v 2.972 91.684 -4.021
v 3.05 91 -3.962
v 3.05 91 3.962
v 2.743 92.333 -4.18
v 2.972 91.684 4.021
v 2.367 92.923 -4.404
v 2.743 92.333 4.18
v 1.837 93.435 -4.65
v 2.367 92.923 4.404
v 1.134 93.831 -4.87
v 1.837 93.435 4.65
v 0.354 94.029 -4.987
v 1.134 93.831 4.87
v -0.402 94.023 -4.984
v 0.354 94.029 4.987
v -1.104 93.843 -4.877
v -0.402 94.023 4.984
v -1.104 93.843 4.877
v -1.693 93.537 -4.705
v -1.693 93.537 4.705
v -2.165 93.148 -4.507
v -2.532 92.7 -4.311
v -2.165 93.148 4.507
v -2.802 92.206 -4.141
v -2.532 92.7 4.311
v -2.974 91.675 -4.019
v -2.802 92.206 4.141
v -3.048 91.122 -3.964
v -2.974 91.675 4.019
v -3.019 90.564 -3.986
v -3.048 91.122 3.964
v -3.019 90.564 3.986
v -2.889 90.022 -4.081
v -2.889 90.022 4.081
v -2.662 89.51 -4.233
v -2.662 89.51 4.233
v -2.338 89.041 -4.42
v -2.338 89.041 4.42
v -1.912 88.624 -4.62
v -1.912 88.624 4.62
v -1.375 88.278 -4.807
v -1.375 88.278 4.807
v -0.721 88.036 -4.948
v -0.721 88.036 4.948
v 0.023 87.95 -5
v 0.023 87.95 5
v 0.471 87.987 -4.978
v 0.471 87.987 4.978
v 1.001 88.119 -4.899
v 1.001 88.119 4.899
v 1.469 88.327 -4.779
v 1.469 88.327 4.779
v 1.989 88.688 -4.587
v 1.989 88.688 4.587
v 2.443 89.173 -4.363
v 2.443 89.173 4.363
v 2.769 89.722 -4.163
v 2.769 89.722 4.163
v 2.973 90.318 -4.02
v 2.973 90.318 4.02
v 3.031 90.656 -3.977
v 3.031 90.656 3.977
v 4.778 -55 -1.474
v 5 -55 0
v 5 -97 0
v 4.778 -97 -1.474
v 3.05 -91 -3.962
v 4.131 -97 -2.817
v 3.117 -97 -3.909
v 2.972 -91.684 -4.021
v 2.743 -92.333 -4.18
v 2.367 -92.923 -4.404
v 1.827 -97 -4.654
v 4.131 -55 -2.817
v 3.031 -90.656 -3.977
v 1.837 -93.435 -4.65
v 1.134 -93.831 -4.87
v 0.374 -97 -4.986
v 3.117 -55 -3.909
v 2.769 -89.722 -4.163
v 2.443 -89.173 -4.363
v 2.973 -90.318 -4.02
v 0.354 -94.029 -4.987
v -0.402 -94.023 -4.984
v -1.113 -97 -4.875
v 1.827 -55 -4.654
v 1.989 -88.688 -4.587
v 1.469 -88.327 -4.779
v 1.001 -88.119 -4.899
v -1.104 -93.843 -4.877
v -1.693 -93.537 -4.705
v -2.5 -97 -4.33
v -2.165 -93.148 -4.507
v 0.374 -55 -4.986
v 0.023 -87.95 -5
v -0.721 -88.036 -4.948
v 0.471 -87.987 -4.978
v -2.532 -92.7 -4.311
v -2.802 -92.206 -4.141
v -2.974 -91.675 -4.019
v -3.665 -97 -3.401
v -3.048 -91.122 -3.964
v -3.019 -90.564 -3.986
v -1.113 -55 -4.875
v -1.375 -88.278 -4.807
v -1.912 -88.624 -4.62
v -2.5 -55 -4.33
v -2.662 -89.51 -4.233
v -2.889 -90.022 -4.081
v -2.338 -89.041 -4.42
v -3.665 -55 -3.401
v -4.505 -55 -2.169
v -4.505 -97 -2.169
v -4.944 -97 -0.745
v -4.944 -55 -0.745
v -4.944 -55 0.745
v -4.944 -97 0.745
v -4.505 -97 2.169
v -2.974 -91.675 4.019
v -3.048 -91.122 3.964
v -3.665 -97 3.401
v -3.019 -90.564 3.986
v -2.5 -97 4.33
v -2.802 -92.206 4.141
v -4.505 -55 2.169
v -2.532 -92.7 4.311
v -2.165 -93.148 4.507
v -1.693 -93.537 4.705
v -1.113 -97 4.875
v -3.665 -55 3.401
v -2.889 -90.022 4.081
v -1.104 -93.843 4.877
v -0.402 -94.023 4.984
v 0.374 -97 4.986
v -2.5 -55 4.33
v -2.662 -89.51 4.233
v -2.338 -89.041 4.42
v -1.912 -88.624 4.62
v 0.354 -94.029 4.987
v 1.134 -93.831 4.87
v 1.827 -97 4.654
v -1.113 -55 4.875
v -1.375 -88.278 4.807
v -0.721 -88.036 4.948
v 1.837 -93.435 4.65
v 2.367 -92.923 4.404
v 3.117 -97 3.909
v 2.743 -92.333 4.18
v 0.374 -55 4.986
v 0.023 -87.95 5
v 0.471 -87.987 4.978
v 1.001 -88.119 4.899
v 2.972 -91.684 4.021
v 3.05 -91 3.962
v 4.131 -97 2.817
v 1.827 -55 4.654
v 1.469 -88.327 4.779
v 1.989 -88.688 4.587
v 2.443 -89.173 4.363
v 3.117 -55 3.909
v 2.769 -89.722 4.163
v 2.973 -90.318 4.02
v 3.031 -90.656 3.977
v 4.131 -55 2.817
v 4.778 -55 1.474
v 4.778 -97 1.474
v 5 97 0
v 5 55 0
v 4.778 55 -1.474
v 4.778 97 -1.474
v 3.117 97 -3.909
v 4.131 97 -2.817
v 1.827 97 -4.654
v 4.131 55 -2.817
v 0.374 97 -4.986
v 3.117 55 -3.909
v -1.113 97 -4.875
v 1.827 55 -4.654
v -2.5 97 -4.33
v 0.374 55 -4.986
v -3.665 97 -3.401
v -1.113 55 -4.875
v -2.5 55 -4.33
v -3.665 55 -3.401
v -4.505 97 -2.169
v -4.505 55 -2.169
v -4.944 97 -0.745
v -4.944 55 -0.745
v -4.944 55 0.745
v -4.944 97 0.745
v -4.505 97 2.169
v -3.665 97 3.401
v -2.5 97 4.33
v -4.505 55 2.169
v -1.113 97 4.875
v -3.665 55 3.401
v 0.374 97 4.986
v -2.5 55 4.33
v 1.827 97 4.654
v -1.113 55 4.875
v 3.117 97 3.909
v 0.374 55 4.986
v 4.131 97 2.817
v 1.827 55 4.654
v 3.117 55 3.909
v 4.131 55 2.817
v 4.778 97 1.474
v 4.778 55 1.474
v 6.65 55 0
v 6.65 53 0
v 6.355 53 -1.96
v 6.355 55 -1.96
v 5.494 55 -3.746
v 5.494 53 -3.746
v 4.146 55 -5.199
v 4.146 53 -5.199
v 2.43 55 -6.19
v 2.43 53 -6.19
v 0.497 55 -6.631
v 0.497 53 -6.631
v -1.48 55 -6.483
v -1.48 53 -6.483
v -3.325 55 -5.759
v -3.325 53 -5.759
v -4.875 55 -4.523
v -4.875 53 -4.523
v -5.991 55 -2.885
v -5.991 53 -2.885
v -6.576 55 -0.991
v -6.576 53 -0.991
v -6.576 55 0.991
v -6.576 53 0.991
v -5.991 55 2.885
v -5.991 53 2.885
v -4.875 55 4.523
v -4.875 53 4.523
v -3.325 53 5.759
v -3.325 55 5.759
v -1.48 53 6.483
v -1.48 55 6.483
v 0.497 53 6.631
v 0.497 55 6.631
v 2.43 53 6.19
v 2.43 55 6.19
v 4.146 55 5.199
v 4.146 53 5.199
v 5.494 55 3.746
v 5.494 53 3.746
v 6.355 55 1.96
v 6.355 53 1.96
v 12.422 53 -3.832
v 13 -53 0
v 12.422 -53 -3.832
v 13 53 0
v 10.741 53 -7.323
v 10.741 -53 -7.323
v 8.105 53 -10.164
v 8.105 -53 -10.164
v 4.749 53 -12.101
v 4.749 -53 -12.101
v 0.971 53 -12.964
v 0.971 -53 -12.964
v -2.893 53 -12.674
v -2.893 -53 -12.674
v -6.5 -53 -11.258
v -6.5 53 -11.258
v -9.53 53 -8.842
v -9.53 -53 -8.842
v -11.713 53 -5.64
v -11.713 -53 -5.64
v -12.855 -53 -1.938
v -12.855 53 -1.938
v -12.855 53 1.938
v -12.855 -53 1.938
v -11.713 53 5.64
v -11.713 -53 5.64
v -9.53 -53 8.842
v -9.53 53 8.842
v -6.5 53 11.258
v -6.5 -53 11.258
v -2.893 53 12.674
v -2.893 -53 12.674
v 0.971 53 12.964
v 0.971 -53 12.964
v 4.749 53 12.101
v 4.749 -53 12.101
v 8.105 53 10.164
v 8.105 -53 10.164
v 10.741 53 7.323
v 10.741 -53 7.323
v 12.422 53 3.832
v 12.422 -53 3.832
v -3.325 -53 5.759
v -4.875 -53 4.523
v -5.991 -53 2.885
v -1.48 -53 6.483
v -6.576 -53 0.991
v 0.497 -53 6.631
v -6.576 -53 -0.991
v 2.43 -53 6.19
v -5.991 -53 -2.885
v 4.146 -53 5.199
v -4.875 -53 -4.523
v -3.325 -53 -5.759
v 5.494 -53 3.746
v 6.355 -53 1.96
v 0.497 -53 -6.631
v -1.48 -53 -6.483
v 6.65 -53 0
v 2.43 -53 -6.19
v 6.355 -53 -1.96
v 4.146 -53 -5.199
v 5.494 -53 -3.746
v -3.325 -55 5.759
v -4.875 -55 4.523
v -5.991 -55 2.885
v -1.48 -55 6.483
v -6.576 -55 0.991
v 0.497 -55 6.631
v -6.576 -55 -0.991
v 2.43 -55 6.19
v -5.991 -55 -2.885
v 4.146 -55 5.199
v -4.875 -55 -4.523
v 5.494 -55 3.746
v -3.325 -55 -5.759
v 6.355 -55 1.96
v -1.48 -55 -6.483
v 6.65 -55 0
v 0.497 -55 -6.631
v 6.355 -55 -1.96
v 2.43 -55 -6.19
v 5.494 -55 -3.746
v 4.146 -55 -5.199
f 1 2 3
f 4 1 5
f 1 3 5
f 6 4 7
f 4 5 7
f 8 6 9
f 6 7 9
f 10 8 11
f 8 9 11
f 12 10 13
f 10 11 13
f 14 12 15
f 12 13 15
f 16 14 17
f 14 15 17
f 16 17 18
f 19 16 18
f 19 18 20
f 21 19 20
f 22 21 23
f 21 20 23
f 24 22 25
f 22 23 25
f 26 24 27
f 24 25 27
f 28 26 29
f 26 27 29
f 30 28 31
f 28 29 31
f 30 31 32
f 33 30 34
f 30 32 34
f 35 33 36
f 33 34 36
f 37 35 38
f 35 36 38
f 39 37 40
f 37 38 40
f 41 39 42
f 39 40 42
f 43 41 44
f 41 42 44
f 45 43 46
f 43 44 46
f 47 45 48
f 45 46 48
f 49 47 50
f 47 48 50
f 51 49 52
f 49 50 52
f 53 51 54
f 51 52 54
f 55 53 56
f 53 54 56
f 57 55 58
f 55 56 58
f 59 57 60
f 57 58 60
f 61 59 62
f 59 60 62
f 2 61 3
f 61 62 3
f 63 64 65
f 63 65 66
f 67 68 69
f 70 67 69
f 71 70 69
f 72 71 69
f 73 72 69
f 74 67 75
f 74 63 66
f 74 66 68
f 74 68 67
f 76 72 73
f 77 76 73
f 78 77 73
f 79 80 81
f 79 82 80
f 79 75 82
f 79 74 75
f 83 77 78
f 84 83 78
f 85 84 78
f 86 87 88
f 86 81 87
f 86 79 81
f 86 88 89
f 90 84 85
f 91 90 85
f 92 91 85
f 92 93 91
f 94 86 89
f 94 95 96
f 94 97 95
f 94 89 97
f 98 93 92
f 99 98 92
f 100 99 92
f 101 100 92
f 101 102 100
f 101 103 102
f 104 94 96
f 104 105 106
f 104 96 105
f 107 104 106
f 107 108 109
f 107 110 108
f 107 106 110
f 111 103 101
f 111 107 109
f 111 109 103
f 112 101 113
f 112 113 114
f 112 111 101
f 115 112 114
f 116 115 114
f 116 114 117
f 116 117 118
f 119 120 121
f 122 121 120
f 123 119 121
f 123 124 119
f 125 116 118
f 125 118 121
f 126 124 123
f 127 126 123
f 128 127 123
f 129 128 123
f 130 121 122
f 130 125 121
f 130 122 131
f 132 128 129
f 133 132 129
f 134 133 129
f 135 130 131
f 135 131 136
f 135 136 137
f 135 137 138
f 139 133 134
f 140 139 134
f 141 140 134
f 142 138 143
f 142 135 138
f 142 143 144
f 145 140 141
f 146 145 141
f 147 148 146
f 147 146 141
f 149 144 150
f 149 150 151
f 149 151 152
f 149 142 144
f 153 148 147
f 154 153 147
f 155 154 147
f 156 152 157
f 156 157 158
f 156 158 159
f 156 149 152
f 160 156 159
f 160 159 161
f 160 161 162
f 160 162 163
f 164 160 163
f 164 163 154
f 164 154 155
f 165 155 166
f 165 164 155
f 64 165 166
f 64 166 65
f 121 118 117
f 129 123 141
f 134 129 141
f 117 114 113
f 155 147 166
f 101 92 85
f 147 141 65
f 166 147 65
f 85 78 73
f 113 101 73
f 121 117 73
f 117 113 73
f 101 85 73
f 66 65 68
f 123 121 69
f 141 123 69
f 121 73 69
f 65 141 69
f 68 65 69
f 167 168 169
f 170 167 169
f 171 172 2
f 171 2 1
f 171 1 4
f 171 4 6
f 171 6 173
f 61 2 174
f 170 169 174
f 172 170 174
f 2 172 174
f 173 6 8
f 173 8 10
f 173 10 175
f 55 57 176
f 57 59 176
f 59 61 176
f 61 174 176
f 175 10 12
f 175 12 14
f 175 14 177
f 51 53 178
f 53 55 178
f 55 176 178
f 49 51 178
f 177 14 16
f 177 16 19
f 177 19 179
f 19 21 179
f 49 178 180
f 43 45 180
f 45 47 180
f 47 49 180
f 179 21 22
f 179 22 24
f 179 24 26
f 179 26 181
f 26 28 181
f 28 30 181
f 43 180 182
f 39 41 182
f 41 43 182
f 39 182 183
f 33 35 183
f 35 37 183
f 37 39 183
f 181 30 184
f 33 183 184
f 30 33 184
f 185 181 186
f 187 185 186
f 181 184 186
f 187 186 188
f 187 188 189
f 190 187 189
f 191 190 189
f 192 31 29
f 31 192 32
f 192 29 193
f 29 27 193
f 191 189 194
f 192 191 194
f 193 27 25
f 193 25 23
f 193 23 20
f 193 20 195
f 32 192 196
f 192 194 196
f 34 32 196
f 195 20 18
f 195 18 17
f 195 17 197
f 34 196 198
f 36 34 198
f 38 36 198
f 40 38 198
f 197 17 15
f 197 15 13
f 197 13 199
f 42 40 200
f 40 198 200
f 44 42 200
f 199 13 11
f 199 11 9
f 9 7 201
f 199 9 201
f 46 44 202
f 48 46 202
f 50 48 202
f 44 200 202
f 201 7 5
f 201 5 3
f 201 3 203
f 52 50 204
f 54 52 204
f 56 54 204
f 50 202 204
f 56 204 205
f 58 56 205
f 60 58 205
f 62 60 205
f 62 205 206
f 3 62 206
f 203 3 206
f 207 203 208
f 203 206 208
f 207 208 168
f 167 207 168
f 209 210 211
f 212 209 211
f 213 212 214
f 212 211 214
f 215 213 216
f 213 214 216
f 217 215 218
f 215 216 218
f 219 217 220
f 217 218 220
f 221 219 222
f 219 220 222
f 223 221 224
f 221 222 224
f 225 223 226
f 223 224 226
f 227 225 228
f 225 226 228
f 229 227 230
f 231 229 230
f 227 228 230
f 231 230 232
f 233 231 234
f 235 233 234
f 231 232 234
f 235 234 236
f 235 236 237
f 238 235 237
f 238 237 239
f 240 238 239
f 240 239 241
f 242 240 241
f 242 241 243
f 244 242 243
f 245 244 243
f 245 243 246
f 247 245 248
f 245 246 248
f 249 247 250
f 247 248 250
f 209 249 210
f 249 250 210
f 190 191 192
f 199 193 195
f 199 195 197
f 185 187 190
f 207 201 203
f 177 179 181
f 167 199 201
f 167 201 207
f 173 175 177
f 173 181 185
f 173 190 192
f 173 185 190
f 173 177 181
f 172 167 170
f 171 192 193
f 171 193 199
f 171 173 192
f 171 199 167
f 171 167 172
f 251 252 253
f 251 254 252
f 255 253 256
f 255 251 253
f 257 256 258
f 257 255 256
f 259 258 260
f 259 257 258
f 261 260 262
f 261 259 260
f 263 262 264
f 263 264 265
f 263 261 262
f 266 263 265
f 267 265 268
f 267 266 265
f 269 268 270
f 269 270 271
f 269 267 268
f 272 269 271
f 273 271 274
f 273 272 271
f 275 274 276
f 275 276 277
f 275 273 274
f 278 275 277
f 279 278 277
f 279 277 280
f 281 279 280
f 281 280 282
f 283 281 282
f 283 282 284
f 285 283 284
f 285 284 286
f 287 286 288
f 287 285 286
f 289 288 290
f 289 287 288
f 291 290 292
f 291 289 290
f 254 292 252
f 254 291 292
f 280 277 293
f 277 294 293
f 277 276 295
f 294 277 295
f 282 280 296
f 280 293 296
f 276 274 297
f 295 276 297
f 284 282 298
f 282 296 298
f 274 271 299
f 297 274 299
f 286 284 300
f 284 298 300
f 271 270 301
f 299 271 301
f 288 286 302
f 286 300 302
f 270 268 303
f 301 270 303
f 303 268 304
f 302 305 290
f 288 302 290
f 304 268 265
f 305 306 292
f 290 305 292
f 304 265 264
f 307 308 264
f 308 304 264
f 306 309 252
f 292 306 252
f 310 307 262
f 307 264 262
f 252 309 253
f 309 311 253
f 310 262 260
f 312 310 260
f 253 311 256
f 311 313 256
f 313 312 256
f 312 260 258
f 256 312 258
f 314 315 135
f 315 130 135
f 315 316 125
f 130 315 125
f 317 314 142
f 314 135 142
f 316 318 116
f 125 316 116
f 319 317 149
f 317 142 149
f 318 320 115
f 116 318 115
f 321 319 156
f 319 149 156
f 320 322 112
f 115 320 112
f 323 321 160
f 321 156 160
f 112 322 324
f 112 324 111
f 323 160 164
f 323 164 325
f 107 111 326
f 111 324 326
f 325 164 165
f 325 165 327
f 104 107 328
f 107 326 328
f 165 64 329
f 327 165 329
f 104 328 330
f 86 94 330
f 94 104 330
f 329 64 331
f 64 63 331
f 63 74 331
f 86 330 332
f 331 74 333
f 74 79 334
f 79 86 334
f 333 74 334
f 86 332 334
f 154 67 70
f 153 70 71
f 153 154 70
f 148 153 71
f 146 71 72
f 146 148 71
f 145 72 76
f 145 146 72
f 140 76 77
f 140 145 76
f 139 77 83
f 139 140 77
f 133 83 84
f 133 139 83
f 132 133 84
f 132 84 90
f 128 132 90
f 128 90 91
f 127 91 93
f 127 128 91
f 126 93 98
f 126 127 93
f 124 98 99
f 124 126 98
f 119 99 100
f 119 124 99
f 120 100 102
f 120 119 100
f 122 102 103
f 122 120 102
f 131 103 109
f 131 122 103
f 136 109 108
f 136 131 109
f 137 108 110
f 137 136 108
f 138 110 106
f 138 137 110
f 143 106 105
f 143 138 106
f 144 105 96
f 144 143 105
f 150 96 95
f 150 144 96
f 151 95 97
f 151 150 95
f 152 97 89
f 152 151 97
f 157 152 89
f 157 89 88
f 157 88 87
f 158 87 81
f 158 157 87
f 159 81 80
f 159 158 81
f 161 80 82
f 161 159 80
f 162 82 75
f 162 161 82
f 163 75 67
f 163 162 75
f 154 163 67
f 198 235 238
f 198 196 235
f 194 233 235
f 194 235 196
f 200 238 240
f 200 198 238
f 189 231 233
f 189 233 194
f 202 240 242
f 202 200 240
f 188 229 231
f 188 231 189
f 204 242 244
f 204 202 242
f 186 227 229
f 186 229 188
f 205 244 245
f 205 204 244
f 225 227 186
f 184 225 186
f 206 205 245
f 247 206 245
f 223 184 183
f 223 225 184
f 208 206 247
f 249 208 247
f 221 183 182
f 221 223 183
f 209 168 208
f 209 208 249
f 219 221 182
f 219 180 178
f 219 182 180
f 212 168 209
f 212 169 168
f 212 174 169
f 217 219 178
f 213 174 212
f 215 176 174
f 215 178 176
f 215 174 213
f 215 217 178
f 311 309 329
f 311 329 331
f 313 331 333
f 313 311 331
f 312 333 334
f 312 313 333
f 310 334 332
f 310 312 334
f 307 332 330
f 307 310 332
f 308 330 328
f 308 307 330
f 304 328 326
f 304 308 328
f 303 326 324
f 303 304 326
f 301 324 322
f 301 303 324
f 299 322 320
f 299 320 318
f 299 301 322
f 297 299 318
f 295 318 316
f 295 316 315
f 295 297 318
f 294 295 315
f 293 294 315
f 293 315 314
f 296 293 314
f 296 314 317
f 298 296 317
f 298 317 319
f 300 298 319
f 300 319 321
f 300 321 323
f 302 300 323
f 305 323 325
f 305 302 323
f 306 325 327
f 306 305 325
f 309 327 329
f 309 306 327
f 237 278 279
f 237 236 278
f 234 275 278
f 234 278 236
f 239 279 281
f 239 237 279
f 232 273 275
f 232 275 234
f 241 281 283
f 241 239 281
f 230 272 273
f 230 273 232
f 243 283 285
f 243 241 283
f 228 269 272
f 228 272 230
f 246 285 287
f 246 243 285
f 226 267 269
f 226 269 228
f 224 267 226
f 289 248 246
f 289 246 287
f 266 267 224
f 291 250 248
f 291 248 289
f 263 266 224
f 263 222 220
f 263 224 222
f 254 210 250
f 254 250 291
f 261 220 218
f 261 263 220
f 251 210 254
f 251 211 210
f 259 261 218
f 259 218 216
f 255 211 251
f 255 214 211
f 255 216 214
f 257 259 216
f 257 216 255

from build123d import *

# Parameters (mm, degrees)
SKETCH1_R                = 13
BOSS_EXTRUDE1_DEPTH      = 53
BOSS_EXTRUDE1_DEPTH_BACK = 53
SKETCH2_R                = 6.65
BOSS_EXTRUDE2_DEPTH      = 2
SKETCH3_R                = 5
BOSS_EXTRUDE3_DEPTH      = 42
SKETCH4_R                = 3.05
CUT_EXTRUDE1_DEPTH       = 14


with BuildPart() as part:
    # Sketch1 → Boss-Extrude1 (new body, two sides)
    with BuildSketch(Plane(origin=(0, 0, 0), x_dir=(1, 0, 0), z_dir=(0, 1, 0))) as boss_extrude1_sk:
        Circle(SKETCH1_R)
    extrude(amount=BOSS_EXTRUDE1_DEPTH)
    extrude(boss_extrude1_sk.sketch, amount=-BOSS_EXTRUDE1_DEPTH_BACK)

    # Sketch2 → Boss-Extrude2 (add)
    with BuildSketch(Plane(origin=(0, 53, 0), x_dir=(1, 0, 0), z_dir=(0, 1, 0))):
        Circle(SKETCH2_R)
    boss_extrude2 = extrude(amount=BOSS_EXTRUDE2_DEPTH)

    # Sketch3 → Boss-Extrude3 (add)
    with BuildSketch(Plane(origin=(0, 55, 0), x_dir=(1, 0, 0), z_dir=(0, 1, 0))):
        Circle(SKETCH3_R)
    boss_extrude3 = extrude(amount=BOSS_EXTRUDE3_DEPTH)

    # Mirror1: Boss-Extrude2, Boss-Extrude3 across plane
    add(boss_extrude2.mirror(Plane.ZX))
    add(boss_extrude3.mirror(Plane.ZX))

    # Sketch4 → Cut-Extrude1 (cut, symmetric)
    with BuildSketch(Plane.XY):
        with Locations((0, 91)):
            Circle(SKETCH4_R)
    cut_extrude1 = extrude(amount=CUT_EXTRUDE1_DEPTH, both=True, mode=Mode.SUBTRACT)

    # Mirror2: Cut-Extrude1 across plane
    add(cut_extrude1.mirror(Plane.ZX), mode=Mode.SUBTRACT)


solid = part.part
